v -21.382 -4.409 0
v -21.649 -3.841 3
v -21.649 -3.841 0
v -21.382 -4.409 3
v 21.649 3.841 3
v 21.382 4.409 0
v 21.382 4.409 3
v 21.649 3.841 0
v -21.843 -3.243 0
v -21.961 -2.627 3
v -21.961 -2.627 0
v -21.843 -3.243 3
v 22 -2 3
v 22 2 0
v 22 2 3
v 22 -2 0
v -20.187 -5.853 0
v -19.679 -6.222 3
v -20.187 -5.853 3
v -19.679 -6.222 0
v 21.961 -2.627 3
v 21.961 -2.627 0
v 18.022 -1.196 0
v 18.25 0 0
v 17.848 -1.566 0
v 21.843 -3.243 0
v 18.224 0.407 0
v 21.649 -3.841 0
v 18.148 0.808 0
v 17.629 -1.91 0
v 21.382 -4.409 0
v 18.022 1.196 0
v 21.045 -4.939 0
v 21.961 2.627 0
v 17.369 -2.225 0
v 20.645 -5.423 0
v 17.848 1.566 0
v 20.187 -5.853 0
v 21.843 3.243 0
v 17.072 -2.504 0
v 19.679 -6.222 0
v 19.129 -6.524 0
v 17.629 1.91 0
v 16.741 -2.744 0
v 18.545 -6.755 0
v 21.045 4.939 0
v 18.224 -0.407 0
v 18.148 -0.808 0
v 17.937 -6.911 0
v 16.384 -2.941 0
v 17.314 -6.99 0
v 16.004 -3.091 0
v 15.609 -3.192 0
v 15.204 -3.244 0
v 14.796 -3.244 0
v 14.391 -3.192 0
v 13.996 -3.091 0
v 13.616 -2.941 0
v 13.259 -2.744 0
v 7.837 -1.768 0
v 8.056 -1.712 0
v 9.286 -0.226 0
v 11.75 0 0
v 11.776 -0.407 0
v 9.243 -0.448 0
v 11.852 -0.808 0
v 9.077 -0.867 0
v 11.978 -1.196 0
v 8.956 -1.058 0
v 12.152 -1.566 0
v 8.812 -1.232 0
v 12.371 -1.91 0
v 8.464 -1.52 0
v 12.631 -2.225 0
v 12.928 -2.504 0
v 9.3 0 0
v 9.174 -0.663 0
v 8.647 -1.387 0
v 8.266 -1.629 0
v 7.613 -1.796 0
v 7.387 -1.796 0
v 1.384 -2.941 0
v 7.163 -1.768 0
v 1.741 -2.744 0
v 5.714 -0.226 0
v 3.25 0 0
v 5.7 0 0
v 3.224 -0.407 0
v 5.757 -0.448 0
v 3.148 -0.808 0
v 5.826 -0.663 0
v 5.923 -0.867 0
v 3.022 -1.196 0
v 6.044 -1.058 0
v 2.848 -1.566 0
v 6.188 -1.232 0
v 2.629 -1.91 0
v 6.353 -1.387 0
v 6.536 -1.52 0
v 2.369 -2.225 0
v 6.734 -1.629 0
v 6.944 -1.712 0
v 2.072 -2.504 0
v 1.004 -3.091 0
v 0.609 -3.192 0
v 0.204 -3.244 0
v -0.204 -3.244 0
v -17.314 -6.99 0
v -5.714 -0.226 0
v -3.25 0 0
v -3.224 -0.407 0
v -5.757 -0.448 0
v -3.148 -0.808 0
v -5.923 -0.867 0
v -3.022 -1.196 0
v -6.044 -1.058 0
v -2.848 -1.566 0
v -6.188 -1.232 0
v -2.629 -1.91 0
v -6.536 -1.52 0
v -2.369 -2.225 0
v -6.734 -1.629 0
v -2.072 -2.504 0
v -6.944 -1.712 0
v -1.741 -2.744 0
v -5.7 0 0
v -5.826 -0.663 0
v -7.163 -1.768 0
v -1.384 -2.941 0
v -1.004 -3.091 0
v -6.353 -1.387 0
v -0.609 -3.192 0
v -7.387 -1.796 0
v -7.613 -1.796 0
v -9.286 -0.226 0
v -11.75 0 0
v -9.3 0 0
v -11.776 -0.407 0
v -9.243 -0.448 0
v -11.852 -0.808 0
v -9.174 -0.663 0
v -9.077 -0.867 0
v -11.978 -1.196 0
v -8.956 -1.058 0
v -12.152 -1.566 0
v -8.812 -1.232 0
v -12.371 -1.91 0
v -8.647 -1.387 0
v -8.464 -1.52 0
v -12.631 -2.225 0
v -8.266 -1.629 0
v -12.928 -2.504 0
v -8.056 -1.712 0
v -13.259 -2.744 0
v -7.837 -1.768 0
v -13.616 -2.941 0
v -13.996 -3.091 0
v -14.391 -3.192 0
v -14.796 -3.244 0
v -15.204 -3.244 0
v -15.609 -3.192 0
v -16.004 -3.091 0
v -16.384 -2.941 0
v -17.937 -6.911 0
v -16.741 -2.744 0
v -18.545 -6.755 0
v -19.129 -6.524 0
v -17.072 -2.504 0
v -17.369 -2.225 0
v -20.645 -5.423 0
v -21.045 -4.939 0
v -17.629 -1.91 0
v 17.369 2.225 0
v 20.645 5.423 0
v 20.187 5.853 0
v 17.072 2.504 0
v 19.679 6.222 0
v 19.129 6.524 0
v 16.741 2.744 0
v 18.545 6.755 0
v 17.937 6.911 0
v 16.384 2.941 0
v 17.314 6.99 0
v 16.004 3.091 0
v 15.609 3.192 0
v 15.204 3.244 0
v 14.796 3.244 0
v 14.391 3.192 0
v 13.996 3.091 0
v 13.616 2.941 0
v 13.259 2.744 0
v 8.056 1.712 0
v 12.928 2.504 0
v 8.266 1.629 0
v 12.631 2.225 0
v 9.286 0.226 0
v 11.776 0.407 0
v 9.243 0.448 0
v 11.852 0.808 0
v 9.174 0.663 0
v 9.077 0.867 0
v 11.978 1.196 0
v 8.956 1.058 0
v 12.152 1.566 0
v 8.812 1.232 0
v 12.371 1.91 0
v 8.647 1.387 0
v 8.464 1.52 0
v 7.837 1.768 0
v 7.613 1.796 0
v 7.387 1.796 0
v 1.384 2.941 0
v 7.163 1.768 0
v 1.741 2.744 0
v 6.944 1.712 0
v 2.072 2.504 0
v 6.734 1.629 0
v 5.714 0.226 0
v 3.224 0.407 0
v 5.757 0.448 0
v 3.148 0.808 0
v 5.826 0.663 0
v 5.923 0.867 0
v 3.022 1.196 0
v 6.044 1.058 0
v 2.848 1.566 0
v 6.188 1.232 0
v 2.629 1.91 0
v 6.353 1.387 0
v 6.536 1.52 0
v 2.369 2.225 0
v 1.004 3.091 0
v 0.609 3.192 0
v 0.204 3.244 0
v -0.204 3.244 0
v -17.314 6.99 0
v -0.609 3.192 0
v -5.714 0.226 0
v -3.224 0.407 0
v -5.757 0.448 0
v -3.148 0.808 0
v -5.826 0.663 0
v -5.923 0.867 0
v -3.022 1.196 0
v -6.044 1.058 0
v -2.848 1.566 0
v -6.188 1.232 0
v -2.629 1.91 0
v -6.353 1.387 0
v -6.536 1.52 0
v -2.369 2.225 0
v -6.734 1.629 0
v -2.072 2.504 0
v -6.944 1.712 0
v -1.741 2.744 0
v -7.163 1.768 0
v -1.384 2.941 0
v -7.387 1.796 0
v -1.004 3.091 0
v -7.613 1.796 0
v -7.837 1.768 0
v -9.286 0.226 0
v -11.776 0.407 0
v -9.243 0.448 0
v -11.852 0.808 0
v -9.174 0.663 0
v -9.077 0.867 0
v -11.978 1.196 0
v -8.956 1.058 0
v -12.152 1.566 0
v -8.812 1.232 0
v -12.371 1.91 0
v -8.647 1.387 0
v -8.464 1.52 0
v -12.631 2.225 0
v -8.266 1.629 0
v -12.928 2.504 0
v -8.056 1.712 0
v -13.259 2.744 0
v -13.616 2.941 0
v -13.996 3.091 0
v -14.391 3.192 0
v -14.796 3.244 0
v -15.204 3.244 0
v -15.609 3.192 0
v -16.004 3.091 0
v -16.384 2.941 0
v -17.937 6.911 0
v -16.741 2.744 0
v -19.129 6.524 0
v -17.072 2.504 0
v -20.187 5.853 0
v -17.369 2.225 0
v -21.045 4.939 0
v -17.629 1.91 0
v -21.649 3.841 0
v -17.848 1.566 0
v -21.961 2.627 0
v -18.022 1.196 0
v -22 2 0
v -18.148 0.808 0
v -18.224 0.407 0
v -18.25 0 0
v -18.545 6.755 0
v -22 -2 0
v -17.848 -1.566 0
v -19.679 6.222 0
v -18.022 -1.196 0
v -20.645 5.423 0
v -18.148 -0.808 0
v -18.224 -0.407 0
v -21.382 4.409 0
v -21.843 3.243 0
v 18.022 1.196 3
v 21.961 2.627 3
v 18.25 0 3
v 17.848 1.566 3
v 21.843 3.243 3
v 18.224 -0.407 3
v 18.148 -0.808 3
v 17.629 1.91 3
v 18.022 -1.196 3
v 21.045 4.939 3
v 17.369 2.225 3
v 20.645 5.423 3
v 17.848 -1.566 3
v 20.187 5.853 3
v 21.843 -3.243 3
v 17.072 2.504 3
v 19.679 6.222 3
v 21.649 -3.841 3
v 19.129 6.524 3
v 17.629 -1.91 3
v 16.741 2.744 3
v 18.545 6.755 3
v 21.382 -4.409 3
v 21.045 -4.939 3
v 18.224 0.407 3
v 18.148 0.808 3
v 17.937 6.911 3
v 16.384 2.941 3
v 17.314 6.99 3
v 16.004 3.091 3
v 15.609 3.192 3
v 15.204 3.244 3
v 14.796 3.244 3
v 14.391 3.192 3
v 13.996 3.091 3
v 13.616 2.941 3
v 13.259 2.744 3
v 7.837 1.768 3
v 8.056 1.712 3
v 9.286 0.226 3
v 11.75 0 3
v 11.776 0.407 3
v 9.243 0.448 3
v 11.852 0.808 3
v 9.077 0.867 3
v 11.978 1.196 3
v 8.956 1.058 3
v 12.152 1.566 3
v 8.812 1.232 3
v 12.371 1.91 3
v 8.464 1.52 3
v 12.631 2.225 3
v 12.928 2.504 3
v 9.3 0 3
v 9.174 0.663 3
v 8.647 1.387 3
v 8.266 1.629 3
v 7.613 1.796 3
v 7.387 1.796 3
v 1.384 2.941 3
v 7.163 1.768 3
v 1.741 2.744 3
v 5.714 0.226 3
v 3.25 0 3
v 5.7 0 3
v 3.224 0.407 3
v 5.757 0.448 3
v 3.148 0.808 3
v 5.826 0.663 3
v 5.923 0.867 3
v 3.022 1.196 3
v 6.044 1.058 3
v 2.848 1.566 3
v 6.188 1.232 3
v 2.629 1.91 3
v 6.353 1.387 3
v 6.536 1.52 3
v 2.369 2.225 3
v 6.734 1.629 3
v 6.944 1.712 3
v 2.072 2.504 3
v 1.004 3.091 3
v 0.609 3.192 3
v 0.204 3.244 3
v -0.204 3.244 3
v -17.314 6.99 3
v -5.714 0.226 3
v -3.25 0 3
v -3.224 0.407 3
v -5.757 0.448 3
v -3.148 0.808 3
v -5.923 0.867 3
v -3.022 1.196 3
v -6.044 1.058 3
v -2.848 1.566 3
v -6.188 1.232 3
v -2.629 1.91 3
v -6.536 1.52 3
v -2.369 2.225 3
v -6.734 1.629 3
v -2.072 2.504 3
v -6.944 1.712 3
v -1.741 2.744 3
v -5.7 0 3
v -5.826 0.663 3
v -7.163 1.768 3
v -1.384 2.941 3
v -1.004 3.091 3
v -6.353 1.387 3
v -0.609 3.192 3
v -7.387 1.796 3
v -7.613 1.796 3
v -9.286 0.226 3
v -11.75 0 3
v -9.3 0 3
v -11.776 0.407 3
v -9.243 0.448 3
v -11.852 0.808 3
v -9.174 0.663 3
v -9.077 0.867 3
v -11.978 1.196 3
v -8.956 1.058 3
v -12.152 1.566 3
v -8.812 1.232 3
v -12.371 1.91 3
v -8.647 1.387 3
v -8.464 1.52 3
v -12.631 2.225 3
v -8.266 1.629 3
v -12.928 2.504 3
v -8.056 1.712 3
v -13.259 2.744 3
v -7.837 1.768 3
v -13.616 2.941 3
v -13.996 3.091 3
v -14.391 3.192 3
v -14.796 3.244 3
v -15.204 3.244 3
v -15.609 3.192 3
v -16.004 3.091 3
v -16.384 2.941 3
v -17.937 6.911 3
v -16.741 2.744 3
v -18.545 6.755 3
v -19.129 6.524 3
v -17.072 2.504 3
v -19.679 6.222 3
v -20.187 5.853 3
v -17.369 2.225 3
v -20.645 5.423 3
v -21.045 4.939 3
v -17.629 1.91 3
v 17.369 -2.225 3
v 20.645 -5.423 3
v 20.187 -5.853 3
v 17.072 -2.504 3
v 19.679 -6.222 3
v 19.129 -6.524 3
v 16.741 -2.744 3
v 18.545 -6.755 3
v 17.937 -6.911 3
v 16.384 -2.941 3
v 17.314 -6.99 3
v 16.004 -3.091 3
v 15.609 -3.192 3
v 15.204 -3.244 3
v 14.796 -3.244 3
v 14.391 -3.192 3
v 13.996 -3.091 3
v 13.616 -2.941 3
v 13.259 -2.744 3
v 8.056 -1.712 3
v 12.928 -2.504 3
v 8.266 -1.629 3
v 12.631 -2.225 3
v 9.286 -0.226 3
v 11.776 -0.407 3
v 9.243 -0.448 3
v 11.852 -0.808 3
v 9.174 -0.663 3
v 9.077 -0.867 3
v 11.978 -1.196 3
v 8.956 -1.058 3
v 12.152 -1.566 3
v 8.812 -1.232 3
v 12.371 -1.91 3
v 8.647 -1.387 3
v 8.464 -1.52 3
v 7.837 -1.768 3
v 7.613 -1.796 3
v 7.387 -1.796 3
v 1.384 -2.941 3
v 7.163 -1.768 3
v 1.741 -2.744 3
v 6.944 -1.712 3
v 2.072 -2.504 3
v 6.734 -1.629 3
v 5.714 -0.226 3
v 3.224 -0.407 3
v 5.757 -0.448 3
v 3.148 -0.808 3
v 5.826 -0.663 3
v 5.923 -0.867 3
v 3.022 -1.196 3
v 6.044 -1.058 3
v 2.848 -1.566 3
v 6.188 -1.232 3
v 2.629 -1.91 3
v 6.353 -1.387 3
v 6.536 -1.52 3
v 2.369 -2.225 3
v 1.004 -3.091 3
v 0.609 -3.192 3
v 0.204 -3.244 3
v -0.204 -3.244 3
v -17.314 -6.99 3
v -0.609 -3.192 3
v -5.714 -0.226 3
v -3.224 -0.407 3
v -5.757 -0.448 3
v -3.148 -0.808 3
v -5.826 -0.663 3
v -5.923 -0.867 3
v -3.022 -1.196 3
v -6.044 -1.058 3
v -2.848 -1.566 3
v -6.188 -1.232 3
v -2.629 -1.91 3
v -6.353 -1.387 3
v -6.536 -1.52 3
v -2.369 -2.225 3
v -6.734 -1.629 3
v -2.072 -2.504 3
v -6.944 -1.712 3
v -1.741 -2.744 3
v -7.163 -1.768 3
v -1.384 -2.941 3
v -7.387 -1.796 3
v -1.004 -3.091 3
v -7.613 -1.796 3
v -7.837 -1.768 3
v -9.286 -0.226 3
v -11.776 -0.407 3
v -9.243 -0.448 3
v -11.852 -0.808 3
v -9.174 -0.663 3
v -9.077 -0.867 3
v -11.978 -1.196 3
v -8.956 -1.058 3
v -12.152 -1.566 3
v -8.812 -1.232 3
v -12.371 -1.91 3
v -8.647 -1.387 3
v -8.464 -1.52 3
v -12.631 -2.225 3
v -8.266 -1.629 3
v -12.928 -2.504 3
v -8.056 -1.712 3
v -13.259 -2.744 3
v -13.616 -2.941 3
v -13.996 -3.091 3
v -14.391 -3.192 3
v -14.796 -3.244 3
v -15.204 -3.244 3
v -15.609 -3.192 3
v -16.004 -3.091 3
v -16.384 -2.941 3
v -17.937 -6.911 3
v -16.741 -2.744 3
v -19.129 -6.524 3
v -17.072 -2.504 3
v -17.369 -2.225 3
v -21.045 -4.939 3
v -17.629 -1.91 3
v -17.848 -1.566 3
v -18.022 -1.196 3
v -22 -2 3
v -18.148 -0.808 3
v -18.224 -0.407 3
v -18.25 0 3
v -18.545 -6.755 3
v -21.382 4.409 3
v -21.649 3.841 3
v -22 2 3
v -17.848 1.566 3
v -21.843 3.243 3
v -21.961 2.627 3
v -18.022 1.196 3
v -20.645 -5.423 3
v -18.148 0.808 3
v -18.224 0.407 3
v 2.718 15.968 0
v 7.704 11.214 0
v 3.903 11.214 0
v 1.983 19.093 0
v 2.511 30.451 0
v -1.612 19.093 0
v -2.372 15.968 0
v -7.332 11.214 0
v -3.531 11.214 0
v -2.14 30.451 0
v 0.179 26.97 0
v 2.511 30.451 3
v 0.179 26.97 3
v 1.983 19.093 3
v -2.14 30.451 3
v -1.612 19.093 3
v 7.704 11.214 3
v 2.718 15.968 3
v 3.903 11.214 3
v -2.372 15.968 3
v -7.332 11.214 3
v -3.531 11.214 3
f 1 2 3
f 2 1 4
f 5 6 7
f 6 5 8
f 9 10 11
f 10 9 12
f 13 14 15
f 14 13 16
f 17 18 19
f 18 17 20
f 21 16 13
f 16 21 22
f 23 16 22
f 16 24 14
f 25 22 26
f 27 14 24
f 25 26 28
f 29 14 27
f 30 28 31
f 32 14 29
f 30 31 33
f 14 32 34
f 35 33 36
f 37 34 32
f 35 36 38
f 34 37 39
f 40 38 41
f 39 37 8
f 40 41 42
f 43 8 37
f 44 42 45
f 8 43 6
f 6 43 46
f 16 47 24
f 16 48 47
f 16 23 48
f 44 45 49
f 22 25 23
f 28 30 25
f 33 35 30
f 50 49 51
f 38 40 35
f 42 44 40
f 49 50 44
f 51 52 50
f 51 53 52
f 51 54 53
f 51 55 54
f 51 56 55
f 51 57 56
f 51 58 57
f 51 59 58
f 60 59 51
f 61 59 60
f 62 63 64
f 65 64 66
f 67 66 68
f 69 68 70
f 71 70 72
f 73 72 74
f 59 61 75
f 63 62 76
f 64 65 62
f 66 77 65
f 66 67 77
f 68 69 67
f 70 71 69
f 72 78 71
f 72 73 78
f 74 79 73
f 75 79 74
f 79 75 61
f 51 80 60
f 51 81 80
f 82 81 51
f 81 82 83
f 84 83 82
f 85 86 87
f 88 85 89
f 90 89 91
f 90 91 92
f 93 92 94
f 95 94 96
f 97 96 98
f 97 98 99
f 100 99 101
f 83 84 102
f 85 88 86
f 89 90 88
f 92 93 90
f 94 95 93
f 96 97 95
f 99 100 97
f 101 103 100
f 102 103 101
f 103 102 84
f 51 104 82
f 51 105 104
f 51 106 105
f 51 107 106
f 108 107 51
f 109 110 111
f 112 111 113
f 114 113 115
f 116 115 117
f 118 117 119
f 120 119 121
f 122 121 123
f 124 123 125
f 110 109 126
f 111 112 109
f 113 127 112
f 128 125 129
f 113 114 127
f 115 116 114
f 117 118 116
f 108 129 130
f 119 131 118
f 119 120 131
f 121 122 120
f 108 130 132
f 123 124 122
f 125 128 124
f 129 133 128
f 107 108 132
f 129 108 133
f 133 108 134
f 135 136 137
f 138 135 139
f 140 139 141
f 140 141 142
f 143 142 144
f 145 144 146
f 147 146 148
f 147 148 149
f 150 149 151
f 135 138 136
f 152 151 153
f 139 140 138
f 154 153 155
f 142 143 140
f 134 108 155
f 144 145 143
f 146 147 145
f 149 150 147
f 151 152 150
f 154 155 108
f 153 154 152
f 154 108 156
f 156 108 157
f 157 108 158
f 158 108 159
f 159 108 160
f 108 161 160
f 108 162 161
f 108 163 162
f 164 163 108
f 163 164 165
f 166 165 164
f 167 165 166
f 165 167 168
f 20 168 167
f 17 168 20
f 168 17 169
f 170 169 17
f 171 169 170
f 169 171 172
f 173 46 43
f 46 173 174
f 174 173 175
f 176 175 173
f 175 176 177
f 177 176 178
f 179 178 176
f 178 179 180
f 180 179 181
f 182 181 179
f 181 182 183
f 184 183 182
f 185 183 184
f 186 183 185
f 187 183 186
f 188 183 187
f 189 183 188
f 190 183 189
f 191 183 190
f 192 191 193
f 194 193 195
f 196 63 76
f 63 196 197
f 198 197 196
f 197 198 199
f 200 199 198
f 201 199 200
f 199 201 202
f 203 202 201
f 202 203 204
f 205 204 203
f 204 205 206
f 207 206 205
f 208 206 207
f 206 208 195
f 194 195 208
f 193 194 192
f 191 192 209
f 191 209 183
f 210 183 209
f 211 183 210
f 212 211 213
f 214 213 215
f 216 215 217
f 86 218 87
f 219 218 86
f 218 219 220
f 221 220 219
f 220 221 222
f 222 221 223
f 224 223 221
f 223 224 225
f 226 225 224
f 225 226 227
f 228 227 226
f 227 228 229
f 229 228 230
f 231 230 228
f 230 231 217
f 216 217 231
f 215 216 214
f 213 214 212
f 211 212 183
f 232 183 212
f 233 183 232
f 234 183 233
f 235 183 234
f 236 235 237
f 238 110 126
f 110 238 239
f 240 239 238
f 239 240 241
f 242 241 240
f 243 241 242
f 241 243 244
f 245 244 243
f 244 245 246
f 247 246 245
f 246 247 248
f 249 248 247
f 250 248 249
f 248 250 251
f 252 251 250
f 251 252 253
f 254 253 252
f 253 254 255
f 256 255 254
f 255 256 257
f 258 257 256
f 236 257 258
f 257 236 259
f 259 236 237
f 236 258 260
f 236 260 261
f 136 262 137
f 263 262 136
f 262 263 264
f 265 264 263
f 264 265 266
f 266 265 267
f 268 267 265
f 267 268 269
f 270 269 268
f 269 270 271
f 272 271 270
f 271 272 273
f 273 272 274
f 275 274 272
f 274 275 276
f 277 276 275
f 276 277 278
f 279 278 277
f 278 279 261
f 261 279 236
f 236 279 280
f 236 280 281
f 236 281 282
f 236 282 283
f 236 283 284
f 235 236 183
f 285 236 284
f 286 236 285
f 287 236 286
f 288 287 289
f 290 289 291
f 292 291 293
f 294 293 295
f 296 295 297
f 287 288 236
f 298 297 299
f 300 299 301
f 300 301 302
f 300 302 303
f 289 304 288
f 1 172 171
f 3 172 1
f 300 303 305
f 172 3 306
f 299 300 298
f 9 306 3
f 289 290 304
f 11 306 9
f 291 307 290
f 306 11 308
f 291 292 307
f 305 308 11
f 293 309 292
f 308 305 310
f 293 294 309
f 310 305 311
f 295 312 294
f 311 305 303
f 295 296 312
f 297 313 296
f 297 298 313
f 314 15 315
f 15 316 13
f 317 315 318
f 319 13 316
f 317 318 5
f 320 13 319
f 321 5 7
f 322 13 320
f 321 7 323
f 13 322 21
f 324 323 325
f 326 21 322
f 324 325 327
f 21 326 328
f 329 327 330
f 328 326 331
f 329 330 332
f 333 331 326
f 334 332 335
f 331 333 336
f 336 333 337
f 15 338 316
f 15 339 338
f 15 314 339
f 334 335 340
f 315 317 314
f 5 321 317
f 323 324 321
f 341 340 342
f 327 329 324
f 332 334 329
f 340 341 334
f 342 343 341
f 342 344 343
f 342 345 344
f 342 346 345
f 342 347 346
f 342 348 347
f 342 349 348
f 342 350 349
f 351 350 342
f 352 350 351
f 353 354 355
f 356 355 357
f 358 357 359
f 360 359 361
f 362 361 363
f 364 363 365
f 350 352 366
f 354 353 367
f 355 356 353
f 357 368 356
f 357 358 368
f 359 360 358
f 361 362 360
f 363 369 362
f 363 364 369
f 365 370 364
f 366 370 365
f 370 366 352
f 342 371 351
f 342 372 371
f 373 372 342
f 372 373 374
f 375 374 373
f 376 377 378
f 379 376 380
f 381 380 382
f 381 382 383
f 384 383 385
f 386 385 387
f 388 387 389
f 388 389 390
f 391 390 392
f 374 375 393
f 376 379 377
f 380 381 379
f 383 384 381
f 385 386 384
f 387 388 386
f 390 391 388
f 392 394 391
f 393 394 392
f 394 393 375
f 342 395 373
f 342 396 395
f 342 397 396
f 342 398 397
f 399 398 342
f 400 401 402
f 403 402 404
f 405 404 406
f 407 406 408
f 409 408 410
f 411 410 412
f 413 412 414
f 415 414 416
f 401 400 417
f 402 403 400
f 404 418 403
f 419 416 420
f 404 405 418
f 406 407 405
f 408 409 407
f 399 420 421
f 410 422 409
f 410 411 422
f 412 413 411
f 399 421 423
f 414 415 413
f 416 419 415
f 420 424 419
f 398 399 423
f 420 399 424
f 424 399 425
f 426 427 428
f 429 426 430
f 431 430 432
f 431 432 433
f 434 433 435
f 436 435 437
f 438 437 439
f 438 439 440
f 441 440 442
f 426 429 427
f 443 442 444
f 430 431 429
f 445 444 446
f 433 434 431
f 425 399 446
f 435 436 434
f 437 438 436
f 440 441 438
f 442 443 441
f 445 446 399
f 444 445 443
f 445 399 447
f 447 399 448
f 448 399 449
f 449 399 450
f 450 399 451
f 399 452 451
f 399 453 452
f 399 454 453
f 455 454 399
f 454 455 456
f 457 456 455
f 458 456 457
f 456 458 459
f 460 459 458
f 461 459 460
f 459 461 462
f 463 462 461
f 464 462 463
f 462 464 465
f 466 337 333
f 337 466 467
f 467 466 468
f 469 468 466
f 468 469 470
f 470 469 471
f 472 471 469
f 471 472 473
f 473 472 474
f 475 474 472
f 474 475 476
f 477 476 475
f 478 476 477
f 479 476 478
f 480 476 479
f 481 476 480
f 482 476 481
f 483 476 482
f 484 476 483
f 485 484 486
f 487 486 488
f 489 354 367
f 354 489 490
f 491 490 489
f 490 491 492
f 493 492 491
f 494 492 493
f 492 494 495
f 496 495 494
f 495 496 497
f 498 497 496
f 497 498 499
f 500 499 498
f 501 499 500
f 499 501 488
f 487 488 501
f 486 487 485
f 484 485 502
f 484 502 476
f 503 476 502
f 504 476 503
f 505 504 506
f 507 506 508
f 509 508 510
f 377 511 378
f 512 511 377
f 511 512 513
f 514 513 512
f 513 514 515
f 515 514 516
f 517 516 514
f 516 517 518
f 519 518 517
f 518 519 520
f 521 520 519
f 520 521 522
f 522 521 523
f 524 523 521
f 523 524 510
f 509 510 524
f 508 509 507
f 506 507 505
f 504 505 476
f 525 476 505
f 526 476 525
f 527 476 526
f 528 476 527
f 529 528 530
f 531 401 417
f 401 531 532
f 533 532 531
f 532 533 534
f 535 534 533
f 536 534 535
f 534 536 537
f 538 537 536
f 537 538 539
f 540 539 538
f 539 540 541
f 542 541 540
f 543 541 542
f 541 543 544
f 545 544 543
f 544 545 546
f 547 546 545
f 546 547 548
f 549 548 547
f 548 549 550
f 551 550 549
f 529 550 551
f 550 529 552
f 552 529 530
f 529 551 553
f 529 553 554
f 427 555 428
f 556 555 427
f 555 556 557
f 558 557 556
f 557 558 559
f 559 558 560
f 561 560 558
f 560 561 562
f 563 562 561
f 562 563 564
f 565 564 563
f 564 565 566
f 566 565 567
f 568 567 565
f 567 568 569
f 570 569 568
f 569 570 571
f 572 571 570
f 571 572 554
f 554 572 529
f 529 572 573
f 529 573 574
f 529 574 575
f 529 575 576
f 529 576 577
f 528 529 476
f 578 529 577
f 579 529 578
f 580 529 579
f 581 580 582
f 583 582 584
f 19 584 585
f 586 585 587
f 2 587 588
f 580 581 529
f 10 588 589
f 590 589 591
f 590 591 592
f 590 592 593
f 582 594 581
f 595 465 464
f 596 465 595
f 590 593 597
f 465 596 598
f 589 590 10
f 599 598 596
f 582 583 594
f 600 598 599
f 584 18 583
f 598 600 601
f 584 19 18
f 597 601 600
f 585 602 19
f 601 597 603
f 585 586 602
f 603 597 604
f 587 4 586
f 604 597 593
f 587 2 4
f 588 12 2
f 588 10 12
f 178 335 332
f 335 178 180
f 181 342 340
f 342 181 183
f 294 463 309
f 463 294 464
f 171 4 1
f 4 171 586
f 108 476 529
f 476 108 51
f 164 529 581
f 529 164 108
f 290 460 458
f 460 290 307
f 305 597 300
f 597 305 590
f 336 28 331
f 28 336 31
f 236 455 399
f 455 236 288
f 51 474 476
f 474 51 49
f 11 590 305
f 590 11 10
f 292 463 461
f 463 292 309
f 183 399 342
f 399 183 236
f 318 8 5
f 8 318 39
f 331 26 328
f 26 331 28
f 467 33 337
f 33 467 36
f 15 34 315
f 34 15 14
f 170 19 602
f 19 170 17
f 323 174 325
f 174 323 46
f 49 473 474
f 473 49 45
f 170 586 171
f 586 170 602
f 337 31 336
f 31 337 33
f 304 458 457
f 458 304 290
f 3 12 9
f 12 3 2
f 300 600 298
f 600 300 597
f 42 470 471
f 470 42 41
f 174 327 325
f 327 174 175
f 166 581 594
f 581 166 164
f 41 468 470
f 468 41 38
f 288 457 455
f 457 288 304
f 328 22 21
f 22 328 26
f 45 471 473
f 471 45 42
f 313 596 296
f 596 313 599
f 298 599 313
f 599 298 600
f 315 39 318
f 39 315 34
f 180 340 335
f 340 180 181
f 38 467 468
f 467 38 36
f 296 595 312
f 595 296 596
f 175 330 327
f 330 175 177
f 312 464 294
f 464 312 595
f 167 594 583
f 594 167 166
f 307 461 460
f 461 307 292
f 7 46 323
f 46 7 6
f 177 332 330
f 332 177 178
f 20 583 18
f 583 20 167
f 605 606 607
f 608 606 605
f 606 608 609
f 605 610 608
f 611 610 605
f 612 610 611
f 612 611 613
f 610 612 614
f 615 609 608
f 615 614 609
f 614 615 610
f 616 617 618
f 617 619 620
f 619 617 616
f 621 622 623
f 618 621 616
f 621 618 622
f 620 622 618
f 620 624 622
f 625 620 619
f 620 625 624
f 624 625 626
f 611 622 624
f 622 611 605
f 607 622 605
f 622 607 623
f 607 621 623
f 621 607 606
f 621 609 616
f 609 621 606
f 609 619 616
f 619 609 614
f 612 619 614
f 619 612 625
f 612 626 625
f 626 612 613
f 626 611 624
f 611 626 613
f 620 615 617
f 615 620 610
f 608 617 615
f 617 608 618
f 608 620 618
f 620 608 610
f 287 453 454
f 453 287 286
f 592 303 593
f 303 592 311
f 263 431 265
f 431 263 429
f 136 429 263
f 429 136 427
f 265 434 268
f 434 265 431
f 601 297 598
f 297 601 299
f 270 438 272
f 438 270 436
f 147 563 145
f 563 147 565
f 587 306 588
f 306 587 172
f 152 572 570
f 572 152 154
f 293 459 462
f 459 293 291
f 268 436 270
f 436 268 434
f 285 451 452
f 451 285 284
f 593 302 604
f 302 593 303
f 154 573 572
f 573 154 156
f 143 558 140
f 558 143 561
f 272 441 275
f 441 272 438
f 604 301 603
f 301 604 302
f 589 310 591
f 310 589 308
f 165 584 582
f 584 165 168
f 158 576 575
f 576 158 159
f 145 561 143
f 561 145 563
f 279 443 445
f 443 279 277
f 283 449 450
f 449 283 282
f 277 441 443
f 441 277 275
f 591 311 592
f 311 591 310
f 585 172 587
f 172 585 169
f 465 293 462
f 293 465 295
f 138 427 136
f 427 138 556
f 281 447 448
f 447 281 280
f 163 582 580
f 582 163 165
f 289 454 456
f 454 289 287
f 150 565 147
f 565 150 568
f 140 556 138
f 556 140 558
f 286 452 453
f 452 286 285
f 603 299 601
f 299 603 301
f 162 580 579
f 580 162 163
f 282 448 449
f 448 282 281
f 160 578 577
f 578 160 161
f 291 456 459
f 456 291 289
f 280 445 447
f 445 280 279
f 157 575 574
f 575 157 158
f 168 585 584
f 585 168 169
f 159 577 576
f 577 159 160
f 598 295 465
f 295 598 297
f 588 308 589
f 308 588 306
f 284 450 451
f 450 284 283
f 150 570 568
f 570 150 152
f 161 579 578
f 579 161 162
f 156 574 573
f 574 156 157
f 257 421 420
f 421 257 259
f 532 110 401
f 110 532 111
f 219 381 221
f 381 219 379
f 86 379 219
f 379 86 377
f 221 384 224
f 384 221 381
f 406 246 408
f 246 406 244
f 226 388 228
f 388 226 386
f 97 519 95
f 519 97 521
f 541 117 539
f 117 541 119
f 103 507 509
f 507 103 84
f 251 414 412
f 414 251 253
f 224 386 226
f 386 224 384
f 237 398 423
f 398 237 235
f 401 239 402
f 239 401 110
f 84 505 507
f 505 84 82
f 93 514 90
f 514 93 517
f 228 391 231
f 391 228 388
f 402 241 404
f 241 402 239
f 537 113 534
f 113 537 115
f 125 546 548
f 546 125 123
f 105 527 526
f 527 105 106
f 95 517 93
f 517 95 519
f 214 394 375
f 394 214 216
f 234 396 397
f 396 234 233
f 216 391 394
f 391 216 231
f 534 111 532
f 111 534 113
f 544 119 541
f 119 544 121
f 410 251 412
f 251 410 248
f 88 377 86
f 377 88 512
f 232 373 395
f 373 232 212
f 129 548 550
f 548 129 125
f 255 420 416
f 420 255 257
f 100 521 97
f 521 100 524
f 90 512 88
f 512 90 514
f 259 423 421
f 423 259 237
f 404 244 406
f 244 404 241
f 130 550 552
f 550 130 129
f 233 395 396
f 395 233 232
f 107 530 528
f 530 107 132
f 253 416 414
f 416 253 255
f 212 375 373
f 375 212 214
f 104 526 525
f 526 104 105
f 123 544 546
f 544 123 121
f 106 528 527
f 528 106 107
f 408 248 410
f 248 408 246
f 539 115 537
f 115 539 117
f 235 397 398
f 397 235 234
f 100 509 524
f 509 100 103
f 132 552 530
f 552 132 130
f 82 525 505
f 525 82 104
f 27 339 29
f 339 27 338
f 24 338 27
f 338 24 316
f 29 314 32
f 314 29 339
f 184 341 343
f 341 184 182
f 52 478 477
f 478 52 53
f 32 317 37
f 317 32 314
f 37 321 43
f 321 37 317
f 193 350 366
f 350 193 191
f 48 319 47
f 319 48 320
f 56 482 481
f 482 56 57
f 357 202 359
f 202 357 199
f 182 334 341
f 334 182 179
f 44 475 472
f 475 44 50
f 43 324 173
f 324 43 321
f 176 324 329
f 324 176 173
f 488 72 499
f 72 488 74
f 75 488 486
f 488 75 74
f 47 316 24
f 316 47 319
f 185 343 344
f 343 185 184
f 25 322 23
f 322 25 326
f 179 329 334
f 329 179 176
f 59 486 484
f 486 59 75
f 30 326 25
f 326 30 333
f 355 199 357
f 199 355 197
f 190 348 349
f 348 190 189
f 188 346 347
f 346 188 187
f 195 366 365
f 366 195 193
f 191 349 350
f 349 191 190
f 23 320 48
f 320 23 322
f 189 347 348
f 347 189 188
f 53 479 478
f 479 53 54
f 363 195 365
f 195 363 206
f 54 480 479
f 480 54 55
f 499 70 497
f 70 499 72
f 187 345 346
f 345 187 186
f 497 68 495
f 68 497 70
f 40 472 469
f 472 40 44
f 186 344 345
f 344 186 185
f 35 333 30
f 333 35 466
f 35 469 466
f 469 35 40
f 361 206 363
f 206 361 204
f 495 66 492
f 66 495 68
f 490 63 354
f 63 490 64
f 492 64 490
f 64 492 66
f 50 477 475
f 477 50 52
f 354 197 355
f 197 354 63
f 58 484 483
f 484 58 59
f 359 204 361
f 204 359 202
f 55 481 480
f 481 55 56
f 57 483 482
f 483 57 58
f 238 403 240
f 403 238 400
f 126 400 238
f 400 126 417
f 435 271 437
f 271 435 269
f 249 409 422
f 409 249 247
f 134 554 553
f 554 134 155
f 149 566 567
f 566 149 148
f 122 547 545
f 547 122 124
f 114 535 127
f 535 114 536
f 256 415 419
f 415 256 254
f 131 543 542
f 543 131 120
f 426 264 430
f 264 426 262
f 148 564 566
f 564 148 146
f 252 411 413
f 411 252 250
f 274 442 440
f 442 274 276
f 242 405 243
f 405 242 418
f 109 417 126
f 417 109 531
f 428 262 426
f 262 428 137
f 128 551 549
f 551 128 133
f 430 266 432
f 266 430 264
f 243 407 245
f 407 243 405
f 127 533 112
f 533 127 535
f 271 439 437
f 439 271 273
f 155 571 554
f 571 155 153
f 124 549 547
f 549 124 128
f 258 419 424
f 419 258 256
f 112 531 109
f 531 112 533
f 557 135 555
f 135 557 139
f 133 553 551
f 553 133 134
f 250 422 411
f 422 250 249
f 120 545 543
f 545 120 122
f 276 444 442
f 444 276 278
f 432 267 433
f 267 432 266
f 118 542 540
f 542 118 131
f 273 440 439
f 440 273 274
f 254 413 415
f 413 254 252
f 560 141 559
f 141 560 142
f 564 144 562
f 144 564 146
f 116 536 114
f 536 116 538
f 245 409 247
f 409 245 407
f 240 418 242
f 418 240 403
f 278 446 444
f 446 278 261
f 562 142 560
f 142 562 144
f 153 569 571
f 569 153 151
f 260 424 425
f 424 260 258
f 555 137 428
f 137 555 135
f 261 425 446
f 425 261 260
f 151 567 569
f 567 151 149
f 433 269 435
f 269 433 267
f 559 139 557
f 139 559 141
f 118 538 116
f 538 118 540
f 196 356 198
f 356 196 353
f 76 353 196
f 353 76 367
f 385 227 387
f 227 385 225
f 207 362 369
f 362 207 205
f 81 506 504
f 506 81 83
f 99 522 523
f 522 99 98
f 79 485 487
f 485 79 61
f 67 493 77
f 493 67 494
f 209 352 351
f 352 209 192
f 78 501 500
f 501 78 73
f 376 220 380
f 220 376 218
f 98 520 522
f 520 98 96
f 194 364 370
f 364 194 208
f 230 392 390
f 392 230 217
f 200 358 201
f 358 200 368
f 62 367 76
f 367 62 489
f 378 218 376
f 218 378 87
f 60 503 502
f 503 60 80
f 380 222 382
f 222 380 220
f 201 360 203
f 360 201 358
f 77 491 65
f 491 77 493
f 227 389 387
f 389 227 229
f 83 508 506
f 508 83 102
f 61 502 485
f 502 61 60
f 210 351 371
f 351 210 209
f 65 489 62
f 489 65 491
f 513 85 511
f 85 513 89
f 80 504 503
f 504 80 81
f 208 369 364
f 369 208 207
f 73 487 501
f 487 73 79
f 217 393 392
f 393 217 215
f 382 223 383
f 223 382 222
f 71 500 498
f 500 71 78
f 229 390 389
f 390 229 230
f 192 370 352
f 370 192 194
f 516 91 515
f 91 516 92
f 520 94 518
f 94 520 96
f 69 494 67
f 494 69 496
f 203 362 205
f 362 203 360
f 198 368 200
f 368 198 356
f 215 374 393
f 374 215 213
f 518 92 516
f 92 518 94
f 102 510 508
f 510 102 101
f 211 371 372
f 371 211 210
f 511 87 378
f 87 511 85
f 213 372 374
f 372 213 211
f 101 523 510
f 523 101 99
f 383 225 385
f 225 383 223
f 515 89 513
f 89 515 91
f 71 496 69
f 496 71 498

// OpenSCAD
$fn = 50;


difference() {
	union() {
		hull() {
			translate(v = [-17.0000000000, 2.0000000000, 0]) {
				cylinder(h = 3, r = 5);
			}
			translate(v = [17.0000000000, 2.0000000000, 0]) {
				cylinder(h = 3, r = 5);
			}
			translate(v = [-17.0000000000, -2.0000000000, 0]) {
				cylinder(h = 3, r = 5);
			}
			translate(v = [17.0000000000, -2.0000000000, 0]) {
				cylinder(h = 3, r = 5);
			}
		}
		translate(v = [0, 30.0000000000, 0]) {
			linear_extrude(height = 3) {
				text(font = "DejaVu Sans Mono:style=Bold", halign = "center", size = 19.0000000000, text = "A", valign = "top");
			}
		}
	}
	union() {
		translate(v = [-15.0000000000, 0.0000000000, 0]) {
			translate(v = [0, 0, -100]) {
				cylinder(h = 200, r = 3.2500000000);
			}
		}
		translate(v = [0, 0, -100]) {
			cylinder(h = 200, r = 3.2500000000);
		}
		translate(v = [15.0000000000, 0.0000000000, 0]) {
			translate(v = [0, 0, -100]) {
				cylinder(h = 200, r = 3.2500000000);
			}
		}
		translate(v = [-15.0000000000, 0.0000000000, 0]) {
			translate(v = [0, 0, -100]) {
				cylinder(h = 200, r = 1.8000000000);
			}
		}
		translate(v = [-7.5000000000, 0.0000000000, 0]) {
			translate(v = [0, 0, -100]) {
				cylinder(h = 200, r = 1.8000000000);
			}
		}
		translate(v = [0, 0, -100]) {
			cylinder(h = 200, r = 1.8000000000);
		}
		translate(v = [7.5000000000, 0.0000000000, 0]) {
			translate(v = [0, 0, -100]) {
				cylinder(h = 200, r = 1.8000000000);
			}
		}
		translate(v = [15.0000000000, 0.0000000000, 0]) {
			translate(v = [0, 0, -100]) {
				cylinder(h = 200, r = 1.8000000000);
			}
		}
	}
}
